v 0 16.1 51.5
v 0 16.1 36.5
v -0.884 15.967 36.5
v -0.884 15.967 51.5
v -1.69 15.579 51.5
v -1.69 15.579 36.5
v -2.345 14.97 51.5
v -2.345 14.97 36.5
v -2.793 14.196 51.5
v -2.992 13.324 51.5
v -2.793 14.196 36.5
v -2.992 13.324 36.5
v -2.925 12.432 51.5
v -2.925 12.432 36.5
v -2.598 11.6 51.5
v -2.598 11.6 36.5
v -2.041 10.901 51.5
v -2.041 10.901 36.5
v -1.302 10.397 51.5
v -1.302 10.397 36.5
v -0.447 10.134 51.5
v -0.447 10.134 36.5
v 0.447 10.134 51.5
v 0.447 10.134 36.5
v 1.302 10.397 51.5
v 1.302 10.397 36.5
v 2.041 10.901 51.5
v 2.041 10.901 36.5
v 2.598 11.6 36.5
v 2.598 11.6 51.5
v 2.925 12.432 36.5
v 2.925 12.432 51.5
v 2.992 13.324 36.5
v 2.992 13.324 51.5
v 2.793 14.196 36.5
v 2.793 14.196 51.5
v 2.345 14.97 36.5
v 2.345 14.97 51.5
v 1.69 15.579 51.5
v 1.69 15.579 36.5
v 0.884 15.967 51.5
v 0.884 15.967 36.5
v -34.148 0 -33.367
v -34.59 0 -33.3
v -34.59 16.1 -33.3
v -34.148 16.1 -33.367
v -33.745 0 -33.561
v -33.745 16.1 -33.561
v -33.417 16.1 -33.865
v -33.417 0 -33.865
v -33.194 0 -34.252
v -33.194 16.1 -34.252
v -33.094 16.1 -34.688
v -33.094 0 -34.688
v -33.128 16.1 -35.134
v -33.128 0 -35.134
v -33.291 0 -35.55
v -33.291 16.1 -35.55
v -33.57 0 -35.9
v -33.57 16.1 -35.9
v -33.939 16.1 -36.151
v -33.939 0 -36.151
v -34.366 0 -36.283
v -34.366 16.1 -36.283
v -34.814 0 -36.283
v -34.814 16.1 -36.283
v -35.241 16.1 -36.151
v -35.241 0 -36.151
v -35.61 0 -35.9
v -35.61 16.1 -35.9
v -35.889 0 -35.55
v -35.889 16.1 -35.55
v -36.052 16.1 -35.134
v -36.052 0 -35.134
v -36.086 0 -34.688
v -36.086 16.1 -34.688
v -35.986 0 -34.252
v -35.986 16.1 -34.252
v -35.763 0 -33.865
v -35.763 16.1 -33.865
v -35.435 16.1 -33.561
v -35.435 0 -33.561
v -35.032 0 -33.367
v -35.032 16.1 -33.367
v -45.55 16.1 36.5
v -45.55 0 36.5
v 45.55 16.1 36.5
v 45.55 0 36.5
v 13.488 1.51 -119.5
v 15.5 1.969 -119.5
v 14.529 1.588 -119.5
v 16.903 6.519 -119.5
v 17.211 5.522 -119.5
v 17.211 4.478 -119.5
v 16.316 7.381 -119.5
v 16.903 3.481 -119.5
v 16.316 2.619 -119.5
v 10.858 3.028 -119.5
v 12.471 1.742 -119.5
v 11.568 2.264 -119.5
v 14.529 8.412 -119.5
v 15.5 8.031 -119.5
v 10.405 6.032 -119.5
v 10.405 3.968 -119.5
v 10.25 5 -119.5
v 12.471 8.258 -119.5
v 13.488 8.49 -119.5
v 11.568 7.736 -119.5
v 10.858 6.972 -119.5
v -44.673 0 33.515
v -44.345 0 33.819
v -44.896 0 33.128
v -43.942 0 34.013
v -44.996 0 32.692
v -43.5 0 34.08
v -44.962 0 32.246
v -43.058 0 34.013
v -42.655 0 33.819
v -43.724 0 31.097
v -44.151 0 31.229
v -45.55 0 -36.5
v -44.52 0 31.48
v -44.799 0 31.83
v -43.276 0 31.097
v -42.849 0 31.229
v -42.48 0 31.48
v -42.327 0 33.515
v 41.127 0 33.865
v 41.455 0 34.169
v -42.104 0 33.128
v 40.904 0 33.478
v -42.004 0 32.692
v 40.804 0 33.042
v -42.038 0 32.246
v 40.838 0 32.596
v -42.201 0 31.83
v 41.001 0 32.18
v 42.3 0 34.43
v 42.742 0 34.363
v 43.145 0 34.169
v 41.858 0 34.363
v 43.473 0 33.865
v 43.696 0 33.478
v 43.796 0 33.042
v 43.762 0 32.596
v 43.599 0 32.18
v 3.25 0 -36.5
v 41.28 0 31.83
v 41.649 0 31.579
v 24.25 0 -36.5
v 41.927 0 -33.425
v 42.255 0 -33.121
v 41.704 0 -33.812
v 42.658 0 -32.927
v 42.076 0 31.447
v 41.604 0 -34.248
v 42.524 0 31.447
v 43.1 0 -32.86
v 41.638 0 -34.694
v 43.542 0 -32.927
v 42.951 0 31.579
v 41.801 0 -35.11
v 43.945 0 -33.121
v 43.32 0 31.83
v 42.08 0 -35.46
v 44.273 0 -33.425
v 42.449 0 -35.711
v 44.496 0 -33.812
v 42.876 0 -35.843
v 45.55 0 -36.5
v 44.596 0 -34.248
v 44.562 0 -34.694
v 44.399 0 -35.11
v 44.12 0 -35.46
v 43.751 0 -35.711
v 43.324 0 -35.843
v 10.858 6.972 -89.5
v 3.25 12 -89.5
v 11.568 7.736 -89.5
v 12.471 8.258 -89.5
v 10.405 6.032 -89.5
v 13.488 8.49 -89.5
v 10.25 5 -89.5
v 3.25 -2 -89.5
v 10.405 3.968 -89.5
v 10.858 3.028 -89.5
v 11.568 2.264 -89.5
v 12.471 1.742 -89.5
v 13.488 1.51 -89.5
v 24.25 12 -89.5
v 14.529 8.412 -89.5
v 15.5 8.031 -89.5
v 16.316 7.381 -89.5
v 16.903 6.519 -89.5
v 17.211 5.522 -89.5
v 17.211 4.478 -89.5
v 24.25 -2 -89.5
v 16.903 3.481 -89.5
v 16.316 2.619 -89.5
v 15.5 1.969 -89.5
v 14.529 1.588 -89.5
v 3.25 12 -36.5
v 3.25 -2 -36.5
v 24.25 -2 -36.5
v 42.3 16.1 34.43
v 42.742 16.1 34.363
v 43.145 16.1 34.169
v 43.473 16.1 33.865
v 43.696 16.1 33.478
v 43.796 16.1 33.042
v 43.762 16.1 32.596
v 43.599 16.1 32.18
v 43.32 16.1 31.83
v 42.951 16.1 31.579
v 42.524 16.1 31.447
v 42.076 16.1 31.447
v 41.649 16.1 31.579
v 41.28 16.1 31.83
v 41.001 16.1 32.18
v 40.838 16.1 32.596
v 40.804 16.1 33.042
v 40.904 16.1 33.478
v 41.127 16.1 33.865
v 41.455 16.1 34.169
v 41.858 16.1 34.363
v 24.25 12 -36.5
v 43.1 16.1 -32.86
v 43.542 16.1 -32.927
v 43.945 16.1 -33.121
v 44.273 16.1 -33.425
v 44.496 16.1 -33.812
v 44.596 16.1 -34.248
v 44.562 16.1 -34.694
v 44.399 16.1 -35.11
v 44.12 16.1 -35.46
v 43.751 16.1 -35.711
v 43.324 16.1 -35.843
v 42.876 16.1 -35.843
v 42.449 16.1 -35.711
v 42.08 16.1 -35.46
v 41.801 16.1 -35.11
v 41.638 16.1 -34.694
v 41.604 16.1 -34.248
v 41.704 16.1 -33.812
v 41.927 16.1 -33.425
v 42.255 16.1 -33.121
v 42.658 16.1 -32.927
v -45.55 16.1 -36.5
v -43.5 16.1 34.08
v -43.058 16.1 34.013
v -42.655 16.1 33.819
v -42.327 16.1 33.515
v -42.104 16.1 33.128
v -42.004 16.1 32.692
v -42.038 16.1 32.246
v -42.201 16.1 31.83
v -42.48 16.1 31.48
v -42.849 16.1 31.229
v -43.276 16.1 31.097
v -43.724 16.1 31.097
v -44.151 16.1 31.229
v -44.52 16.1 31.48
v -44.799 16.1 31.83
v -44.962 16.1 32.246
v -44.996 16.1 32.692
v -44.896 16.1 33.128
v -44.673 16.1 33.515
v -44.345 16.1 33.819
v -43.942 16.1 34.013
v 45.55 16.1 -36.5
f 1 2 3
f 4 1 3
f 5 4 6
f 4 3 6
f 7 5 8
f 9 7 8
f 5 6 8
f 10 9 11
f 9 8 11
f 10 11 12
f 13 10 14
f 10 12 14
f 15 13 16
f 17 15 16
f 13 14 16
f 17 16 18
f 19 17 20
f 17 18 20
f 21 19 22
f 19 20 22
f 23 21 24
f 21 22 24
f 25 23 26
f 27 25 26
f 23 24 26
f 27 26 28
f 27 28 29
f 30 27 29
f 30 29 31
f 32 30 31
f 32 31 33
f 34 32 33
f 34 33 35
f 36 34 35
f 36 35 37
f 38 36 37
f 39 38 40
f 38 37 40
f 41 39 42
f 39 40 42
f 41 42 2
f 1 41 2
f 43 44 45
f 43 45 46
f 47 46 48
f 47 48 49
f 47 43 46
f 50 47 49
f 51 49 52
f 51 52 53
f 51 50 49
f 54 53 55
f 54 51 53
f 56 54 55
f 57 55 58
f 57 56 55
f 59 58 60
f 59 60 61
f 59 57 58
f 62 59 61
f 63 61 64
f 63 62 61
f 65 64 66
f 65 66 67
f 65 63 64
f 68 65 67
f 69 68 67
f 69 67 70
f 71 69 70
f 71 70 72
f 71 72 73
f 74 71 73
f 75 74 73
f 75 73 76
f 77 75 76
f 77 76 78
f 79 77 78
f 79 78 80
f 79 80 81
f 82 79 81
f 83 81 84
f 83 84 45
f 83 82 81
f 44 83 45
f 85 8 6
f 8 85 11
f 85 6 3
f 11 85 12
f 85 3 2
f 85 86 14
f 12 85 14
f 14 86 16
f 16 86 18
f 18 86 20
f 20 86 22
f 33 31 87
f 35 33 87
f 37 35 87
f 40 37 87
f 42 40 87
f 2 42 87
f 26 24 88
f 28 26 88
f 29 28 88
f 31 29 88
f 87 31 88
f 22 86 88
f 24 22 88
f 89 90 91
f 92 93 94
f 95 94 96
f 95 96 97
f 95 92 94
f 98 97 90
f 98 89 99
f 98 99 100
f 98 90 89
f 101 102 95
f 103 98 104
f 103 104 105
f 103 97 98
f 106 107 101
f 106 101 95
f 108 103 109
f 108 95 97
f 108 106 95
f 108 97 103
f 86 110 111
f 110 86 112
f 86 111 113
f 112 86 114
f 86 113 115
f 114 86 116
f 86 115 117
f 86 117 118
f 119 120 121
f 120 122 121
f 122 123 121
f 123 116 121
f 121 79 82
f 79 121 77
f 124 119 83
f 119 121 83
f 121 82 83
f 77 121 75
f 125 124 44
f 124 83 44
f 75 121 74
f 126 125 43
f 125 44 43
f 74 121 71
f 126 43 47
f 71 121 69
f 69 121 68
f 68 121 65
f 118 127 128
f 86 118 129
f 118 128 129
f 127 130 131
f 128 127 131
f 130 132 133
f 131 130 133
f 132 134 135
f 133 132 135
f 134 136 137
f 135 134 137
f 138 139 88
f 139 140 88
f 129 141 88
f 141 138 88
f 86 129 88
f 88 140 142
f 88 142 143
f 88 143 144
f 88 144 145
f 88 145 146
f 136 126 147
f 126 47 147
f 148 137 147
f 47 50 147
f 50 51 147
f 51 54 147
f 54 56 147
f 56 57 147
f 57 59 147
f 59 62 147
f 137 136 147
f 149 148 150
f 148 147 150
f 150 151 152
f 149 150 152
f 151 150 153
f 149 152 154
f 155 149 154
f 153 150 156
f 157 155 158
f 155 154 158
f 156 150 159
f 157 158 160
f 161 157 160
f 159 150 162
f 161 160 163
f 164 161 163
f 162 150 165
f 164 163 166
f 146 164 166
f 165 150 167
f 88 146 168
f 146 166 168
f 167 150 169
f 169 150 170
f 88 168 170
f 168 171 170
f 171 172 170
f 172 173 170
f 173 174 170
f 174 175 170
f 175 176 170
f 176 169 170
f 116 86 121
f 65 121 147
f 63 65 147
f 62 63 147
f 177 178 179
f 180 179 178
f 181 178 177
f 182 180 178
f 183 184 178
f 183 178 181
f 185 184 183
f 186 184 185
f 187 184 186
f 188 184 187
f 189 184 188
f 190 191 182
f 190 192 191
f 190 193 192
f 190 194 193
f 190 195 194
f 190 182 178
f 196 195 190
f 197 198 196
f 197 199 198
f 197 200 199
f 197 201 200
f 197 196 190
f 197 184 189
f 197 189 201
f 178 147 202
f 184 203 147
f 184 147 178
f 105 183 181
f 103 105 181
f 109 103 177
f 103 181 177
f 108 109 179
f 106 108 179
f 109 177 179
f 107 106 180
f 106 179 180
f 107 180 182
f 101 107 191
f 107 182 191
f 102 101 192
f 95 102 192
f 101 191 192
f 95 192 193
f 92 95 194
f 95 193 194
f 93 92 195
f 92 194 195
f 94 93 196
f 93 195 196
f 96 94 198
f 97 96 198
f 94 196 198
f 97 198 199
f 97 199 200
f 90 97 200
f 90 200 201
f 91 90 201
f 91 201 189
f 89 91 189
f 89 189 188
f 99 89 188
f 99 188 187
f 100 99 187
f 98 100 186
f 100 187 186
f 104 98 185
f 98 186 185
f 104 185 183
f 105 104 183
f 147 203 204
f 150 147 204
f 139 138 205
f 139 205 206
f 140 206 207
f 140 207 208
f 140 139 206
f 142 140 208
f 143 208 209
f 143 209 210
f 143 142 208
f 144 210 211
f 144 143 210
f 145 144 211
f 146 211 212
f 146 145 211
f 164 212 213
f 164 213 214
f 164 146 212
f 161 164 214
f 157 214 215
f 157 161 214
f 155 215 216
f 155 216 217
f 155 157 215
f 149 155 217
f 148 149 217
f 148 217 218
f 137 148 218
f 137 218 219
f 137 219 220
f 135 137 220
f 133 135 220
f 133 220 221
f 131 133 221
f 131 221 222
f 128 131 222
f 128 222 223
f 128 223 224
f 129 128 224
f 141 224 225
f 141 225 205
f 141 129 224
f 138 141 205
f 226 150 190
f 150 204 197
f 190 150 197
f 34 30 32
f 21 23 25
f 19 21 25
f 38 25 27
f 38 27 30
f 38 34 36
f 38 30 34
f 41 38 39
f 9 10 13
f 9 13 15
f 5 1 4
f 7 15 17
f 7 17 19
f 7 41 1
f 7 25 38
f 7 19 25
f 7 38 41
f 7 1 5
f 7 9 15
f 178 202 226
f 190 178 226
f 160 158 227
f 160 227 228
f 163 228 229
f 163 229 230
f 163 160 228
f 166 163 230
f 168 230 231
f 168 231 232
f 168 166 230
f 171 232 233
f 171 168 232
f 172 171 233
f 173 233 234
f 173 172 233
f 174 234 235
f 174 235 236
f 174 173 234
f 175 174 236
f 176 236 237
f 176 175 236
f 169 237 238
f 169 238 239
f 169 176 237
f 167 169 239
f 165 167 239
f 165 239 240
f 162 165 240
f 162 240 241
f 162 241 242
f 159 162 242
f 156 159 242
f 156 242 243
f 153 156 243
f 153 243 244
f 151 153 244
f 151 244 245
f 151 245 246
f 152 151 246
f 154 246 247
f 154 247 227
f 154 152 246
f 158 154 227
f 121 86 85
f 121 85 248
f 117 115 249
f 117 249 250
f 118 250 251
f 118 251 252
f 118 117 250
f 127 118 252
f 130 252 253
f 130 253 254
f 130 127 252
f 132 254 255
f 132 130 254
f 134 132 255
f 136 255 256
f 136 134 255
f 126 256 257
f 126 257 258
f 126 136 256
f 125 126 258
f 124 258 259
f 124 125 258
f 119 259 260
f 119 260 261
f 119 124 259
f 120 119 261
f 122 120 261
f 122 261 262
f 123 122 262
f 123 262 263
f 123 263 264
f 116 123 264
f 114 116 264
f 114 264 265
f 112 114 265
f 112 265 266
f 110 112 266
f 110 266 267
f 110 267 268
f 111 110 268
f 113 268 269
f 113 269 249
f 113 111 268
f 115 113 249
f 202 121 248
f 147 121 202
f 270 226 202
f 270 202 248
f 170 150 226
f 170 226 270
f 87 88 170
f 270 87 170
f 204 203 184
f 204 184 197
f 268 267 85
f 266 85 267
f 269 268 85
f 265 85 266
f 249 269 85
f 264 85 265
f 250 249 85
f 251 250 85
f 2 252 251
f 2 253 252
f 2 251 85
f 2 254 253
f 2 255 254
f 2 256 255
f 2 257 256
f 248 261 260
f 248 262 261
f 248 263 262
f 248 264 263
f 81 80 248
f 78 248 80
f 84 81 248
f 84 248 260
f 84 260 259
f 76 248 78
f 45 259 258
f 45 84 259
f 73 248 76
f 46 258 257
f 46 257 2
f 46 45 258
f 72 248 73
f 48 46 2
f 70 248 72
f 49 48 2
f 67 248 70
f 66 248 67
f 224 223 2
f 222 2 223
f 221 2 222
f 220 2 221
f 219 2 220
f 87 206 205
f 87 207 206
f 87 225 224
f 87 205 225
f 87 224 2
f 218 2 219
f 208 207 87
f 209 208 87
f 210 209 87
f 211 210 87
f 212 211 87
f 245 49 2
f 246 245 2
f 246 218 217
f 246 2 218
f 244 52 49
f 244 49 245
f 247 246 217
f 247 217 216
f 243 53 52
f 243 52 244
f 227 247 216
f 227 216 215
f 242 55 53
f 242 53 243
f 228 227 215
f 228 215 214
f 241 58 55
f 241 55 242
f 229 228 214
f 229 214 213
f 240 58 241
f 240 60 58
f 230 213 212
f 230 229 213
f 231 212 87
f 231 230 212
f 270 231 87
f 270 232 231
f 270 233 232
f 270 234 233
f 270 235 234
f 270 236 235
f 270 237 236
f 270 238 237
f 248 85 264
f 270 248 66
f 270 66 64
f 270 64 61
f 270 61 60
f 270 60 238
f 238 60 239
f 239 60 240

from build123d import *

# Parameters (mm, degrees)
SKETCH1_W                = 91.1
SKETCH1_H                = 73
SKETCH1_R                = 1.5
BOSS_EXTRUDE1_DEPTH      = 16.1
SKETCH2_R                = 3
BOSS_EXTRUDE2_DEPTH      = 15
BOSS_EXTRUDE3_DEPTH      = 12
BOSS_EXTRUDE3_DEPTH_BACK = 2
SKETCH3_W                = 21
SKETCH3_H                = 53
SKETCH4_R                = 3.5
BOSS_EXTRUDE4_DEPTH      = 30


with BuildPart() as part:
    # Sketch1 → Boss-Extrude1 (new body)
    with BuildSketch(Plane(origin=(0, 0, 0), x_dir=(1, 0, 0), z_dir=(0, 1, 0))):
        Rectangle(SKETCH1_W, SKETCH1_H)
        with Locations(Location((-34.59, 34.8, 0), (0, 0, 270))):
            Circle(SKETCH1_R, mode=Mode.SUBTRACT)
        with Locations(Location((43.1, 34.36, 0), (0, 0, 270))):
            Circle(SKETCH1_R, mode=Mode.SUBTRACT)
        with Locations(Location((42.3, -32.93, 0), (0, 0, 270))):
            Circle(SKETCH1_R, mode=Mode.SUBTRACT)
        with Locations(Location((-43.5, -32.58, 0), (0, 0, 270))):
            Circle(SKETCH1_R, mode=Mode.SUBTRACT)
    extrude(amount=BOSS_EXTRUDE1_DEPTH)

    # Sketch2 → Boss-Extrude2 (add)
    with BuildSketch(Plane.XY.offset(36.5)):
        with Locations(Location((0, 13.1, 0), (0, 0, 90))):
            Circle(SKETCH2_R)
    extrude(amount=BOSS_EXTRUDE2_DEPTH)

    # Sketch3 → Boss-Extrude3 (add, two sides: drawn at the far end of the back side and taken through both)
    with BuildSketch(Plane(origin=(0, 0, 0), x_dir=(1, 0, 0), z_dir=(0, 1, 0)).offset(-BOSS_EXTRUDE3_DEPTH_BACK)):
        with Locations((13.75, 63)):
            Rectangle(SKETCH3_W, SKETCH3_H)
    extrude(amount=BOSS_EXTRUDE3_DEPTH + BOSS_EXTRUDE3_DEPTH_BACK)

    # Sketch4 → Boss-Extrude4 (add)
    with BuildSketch(Plane(origin=(0, 0, -89.5), x_dir=(-1, 0, 0), z_dir=(0, 0, -1))):
        with Locations((-13.75, 5)):
            Circle(SKETCH4_R)
    extrude(amount=BOSS_EXTRUDE4_DEPTH)


solid = part.part
